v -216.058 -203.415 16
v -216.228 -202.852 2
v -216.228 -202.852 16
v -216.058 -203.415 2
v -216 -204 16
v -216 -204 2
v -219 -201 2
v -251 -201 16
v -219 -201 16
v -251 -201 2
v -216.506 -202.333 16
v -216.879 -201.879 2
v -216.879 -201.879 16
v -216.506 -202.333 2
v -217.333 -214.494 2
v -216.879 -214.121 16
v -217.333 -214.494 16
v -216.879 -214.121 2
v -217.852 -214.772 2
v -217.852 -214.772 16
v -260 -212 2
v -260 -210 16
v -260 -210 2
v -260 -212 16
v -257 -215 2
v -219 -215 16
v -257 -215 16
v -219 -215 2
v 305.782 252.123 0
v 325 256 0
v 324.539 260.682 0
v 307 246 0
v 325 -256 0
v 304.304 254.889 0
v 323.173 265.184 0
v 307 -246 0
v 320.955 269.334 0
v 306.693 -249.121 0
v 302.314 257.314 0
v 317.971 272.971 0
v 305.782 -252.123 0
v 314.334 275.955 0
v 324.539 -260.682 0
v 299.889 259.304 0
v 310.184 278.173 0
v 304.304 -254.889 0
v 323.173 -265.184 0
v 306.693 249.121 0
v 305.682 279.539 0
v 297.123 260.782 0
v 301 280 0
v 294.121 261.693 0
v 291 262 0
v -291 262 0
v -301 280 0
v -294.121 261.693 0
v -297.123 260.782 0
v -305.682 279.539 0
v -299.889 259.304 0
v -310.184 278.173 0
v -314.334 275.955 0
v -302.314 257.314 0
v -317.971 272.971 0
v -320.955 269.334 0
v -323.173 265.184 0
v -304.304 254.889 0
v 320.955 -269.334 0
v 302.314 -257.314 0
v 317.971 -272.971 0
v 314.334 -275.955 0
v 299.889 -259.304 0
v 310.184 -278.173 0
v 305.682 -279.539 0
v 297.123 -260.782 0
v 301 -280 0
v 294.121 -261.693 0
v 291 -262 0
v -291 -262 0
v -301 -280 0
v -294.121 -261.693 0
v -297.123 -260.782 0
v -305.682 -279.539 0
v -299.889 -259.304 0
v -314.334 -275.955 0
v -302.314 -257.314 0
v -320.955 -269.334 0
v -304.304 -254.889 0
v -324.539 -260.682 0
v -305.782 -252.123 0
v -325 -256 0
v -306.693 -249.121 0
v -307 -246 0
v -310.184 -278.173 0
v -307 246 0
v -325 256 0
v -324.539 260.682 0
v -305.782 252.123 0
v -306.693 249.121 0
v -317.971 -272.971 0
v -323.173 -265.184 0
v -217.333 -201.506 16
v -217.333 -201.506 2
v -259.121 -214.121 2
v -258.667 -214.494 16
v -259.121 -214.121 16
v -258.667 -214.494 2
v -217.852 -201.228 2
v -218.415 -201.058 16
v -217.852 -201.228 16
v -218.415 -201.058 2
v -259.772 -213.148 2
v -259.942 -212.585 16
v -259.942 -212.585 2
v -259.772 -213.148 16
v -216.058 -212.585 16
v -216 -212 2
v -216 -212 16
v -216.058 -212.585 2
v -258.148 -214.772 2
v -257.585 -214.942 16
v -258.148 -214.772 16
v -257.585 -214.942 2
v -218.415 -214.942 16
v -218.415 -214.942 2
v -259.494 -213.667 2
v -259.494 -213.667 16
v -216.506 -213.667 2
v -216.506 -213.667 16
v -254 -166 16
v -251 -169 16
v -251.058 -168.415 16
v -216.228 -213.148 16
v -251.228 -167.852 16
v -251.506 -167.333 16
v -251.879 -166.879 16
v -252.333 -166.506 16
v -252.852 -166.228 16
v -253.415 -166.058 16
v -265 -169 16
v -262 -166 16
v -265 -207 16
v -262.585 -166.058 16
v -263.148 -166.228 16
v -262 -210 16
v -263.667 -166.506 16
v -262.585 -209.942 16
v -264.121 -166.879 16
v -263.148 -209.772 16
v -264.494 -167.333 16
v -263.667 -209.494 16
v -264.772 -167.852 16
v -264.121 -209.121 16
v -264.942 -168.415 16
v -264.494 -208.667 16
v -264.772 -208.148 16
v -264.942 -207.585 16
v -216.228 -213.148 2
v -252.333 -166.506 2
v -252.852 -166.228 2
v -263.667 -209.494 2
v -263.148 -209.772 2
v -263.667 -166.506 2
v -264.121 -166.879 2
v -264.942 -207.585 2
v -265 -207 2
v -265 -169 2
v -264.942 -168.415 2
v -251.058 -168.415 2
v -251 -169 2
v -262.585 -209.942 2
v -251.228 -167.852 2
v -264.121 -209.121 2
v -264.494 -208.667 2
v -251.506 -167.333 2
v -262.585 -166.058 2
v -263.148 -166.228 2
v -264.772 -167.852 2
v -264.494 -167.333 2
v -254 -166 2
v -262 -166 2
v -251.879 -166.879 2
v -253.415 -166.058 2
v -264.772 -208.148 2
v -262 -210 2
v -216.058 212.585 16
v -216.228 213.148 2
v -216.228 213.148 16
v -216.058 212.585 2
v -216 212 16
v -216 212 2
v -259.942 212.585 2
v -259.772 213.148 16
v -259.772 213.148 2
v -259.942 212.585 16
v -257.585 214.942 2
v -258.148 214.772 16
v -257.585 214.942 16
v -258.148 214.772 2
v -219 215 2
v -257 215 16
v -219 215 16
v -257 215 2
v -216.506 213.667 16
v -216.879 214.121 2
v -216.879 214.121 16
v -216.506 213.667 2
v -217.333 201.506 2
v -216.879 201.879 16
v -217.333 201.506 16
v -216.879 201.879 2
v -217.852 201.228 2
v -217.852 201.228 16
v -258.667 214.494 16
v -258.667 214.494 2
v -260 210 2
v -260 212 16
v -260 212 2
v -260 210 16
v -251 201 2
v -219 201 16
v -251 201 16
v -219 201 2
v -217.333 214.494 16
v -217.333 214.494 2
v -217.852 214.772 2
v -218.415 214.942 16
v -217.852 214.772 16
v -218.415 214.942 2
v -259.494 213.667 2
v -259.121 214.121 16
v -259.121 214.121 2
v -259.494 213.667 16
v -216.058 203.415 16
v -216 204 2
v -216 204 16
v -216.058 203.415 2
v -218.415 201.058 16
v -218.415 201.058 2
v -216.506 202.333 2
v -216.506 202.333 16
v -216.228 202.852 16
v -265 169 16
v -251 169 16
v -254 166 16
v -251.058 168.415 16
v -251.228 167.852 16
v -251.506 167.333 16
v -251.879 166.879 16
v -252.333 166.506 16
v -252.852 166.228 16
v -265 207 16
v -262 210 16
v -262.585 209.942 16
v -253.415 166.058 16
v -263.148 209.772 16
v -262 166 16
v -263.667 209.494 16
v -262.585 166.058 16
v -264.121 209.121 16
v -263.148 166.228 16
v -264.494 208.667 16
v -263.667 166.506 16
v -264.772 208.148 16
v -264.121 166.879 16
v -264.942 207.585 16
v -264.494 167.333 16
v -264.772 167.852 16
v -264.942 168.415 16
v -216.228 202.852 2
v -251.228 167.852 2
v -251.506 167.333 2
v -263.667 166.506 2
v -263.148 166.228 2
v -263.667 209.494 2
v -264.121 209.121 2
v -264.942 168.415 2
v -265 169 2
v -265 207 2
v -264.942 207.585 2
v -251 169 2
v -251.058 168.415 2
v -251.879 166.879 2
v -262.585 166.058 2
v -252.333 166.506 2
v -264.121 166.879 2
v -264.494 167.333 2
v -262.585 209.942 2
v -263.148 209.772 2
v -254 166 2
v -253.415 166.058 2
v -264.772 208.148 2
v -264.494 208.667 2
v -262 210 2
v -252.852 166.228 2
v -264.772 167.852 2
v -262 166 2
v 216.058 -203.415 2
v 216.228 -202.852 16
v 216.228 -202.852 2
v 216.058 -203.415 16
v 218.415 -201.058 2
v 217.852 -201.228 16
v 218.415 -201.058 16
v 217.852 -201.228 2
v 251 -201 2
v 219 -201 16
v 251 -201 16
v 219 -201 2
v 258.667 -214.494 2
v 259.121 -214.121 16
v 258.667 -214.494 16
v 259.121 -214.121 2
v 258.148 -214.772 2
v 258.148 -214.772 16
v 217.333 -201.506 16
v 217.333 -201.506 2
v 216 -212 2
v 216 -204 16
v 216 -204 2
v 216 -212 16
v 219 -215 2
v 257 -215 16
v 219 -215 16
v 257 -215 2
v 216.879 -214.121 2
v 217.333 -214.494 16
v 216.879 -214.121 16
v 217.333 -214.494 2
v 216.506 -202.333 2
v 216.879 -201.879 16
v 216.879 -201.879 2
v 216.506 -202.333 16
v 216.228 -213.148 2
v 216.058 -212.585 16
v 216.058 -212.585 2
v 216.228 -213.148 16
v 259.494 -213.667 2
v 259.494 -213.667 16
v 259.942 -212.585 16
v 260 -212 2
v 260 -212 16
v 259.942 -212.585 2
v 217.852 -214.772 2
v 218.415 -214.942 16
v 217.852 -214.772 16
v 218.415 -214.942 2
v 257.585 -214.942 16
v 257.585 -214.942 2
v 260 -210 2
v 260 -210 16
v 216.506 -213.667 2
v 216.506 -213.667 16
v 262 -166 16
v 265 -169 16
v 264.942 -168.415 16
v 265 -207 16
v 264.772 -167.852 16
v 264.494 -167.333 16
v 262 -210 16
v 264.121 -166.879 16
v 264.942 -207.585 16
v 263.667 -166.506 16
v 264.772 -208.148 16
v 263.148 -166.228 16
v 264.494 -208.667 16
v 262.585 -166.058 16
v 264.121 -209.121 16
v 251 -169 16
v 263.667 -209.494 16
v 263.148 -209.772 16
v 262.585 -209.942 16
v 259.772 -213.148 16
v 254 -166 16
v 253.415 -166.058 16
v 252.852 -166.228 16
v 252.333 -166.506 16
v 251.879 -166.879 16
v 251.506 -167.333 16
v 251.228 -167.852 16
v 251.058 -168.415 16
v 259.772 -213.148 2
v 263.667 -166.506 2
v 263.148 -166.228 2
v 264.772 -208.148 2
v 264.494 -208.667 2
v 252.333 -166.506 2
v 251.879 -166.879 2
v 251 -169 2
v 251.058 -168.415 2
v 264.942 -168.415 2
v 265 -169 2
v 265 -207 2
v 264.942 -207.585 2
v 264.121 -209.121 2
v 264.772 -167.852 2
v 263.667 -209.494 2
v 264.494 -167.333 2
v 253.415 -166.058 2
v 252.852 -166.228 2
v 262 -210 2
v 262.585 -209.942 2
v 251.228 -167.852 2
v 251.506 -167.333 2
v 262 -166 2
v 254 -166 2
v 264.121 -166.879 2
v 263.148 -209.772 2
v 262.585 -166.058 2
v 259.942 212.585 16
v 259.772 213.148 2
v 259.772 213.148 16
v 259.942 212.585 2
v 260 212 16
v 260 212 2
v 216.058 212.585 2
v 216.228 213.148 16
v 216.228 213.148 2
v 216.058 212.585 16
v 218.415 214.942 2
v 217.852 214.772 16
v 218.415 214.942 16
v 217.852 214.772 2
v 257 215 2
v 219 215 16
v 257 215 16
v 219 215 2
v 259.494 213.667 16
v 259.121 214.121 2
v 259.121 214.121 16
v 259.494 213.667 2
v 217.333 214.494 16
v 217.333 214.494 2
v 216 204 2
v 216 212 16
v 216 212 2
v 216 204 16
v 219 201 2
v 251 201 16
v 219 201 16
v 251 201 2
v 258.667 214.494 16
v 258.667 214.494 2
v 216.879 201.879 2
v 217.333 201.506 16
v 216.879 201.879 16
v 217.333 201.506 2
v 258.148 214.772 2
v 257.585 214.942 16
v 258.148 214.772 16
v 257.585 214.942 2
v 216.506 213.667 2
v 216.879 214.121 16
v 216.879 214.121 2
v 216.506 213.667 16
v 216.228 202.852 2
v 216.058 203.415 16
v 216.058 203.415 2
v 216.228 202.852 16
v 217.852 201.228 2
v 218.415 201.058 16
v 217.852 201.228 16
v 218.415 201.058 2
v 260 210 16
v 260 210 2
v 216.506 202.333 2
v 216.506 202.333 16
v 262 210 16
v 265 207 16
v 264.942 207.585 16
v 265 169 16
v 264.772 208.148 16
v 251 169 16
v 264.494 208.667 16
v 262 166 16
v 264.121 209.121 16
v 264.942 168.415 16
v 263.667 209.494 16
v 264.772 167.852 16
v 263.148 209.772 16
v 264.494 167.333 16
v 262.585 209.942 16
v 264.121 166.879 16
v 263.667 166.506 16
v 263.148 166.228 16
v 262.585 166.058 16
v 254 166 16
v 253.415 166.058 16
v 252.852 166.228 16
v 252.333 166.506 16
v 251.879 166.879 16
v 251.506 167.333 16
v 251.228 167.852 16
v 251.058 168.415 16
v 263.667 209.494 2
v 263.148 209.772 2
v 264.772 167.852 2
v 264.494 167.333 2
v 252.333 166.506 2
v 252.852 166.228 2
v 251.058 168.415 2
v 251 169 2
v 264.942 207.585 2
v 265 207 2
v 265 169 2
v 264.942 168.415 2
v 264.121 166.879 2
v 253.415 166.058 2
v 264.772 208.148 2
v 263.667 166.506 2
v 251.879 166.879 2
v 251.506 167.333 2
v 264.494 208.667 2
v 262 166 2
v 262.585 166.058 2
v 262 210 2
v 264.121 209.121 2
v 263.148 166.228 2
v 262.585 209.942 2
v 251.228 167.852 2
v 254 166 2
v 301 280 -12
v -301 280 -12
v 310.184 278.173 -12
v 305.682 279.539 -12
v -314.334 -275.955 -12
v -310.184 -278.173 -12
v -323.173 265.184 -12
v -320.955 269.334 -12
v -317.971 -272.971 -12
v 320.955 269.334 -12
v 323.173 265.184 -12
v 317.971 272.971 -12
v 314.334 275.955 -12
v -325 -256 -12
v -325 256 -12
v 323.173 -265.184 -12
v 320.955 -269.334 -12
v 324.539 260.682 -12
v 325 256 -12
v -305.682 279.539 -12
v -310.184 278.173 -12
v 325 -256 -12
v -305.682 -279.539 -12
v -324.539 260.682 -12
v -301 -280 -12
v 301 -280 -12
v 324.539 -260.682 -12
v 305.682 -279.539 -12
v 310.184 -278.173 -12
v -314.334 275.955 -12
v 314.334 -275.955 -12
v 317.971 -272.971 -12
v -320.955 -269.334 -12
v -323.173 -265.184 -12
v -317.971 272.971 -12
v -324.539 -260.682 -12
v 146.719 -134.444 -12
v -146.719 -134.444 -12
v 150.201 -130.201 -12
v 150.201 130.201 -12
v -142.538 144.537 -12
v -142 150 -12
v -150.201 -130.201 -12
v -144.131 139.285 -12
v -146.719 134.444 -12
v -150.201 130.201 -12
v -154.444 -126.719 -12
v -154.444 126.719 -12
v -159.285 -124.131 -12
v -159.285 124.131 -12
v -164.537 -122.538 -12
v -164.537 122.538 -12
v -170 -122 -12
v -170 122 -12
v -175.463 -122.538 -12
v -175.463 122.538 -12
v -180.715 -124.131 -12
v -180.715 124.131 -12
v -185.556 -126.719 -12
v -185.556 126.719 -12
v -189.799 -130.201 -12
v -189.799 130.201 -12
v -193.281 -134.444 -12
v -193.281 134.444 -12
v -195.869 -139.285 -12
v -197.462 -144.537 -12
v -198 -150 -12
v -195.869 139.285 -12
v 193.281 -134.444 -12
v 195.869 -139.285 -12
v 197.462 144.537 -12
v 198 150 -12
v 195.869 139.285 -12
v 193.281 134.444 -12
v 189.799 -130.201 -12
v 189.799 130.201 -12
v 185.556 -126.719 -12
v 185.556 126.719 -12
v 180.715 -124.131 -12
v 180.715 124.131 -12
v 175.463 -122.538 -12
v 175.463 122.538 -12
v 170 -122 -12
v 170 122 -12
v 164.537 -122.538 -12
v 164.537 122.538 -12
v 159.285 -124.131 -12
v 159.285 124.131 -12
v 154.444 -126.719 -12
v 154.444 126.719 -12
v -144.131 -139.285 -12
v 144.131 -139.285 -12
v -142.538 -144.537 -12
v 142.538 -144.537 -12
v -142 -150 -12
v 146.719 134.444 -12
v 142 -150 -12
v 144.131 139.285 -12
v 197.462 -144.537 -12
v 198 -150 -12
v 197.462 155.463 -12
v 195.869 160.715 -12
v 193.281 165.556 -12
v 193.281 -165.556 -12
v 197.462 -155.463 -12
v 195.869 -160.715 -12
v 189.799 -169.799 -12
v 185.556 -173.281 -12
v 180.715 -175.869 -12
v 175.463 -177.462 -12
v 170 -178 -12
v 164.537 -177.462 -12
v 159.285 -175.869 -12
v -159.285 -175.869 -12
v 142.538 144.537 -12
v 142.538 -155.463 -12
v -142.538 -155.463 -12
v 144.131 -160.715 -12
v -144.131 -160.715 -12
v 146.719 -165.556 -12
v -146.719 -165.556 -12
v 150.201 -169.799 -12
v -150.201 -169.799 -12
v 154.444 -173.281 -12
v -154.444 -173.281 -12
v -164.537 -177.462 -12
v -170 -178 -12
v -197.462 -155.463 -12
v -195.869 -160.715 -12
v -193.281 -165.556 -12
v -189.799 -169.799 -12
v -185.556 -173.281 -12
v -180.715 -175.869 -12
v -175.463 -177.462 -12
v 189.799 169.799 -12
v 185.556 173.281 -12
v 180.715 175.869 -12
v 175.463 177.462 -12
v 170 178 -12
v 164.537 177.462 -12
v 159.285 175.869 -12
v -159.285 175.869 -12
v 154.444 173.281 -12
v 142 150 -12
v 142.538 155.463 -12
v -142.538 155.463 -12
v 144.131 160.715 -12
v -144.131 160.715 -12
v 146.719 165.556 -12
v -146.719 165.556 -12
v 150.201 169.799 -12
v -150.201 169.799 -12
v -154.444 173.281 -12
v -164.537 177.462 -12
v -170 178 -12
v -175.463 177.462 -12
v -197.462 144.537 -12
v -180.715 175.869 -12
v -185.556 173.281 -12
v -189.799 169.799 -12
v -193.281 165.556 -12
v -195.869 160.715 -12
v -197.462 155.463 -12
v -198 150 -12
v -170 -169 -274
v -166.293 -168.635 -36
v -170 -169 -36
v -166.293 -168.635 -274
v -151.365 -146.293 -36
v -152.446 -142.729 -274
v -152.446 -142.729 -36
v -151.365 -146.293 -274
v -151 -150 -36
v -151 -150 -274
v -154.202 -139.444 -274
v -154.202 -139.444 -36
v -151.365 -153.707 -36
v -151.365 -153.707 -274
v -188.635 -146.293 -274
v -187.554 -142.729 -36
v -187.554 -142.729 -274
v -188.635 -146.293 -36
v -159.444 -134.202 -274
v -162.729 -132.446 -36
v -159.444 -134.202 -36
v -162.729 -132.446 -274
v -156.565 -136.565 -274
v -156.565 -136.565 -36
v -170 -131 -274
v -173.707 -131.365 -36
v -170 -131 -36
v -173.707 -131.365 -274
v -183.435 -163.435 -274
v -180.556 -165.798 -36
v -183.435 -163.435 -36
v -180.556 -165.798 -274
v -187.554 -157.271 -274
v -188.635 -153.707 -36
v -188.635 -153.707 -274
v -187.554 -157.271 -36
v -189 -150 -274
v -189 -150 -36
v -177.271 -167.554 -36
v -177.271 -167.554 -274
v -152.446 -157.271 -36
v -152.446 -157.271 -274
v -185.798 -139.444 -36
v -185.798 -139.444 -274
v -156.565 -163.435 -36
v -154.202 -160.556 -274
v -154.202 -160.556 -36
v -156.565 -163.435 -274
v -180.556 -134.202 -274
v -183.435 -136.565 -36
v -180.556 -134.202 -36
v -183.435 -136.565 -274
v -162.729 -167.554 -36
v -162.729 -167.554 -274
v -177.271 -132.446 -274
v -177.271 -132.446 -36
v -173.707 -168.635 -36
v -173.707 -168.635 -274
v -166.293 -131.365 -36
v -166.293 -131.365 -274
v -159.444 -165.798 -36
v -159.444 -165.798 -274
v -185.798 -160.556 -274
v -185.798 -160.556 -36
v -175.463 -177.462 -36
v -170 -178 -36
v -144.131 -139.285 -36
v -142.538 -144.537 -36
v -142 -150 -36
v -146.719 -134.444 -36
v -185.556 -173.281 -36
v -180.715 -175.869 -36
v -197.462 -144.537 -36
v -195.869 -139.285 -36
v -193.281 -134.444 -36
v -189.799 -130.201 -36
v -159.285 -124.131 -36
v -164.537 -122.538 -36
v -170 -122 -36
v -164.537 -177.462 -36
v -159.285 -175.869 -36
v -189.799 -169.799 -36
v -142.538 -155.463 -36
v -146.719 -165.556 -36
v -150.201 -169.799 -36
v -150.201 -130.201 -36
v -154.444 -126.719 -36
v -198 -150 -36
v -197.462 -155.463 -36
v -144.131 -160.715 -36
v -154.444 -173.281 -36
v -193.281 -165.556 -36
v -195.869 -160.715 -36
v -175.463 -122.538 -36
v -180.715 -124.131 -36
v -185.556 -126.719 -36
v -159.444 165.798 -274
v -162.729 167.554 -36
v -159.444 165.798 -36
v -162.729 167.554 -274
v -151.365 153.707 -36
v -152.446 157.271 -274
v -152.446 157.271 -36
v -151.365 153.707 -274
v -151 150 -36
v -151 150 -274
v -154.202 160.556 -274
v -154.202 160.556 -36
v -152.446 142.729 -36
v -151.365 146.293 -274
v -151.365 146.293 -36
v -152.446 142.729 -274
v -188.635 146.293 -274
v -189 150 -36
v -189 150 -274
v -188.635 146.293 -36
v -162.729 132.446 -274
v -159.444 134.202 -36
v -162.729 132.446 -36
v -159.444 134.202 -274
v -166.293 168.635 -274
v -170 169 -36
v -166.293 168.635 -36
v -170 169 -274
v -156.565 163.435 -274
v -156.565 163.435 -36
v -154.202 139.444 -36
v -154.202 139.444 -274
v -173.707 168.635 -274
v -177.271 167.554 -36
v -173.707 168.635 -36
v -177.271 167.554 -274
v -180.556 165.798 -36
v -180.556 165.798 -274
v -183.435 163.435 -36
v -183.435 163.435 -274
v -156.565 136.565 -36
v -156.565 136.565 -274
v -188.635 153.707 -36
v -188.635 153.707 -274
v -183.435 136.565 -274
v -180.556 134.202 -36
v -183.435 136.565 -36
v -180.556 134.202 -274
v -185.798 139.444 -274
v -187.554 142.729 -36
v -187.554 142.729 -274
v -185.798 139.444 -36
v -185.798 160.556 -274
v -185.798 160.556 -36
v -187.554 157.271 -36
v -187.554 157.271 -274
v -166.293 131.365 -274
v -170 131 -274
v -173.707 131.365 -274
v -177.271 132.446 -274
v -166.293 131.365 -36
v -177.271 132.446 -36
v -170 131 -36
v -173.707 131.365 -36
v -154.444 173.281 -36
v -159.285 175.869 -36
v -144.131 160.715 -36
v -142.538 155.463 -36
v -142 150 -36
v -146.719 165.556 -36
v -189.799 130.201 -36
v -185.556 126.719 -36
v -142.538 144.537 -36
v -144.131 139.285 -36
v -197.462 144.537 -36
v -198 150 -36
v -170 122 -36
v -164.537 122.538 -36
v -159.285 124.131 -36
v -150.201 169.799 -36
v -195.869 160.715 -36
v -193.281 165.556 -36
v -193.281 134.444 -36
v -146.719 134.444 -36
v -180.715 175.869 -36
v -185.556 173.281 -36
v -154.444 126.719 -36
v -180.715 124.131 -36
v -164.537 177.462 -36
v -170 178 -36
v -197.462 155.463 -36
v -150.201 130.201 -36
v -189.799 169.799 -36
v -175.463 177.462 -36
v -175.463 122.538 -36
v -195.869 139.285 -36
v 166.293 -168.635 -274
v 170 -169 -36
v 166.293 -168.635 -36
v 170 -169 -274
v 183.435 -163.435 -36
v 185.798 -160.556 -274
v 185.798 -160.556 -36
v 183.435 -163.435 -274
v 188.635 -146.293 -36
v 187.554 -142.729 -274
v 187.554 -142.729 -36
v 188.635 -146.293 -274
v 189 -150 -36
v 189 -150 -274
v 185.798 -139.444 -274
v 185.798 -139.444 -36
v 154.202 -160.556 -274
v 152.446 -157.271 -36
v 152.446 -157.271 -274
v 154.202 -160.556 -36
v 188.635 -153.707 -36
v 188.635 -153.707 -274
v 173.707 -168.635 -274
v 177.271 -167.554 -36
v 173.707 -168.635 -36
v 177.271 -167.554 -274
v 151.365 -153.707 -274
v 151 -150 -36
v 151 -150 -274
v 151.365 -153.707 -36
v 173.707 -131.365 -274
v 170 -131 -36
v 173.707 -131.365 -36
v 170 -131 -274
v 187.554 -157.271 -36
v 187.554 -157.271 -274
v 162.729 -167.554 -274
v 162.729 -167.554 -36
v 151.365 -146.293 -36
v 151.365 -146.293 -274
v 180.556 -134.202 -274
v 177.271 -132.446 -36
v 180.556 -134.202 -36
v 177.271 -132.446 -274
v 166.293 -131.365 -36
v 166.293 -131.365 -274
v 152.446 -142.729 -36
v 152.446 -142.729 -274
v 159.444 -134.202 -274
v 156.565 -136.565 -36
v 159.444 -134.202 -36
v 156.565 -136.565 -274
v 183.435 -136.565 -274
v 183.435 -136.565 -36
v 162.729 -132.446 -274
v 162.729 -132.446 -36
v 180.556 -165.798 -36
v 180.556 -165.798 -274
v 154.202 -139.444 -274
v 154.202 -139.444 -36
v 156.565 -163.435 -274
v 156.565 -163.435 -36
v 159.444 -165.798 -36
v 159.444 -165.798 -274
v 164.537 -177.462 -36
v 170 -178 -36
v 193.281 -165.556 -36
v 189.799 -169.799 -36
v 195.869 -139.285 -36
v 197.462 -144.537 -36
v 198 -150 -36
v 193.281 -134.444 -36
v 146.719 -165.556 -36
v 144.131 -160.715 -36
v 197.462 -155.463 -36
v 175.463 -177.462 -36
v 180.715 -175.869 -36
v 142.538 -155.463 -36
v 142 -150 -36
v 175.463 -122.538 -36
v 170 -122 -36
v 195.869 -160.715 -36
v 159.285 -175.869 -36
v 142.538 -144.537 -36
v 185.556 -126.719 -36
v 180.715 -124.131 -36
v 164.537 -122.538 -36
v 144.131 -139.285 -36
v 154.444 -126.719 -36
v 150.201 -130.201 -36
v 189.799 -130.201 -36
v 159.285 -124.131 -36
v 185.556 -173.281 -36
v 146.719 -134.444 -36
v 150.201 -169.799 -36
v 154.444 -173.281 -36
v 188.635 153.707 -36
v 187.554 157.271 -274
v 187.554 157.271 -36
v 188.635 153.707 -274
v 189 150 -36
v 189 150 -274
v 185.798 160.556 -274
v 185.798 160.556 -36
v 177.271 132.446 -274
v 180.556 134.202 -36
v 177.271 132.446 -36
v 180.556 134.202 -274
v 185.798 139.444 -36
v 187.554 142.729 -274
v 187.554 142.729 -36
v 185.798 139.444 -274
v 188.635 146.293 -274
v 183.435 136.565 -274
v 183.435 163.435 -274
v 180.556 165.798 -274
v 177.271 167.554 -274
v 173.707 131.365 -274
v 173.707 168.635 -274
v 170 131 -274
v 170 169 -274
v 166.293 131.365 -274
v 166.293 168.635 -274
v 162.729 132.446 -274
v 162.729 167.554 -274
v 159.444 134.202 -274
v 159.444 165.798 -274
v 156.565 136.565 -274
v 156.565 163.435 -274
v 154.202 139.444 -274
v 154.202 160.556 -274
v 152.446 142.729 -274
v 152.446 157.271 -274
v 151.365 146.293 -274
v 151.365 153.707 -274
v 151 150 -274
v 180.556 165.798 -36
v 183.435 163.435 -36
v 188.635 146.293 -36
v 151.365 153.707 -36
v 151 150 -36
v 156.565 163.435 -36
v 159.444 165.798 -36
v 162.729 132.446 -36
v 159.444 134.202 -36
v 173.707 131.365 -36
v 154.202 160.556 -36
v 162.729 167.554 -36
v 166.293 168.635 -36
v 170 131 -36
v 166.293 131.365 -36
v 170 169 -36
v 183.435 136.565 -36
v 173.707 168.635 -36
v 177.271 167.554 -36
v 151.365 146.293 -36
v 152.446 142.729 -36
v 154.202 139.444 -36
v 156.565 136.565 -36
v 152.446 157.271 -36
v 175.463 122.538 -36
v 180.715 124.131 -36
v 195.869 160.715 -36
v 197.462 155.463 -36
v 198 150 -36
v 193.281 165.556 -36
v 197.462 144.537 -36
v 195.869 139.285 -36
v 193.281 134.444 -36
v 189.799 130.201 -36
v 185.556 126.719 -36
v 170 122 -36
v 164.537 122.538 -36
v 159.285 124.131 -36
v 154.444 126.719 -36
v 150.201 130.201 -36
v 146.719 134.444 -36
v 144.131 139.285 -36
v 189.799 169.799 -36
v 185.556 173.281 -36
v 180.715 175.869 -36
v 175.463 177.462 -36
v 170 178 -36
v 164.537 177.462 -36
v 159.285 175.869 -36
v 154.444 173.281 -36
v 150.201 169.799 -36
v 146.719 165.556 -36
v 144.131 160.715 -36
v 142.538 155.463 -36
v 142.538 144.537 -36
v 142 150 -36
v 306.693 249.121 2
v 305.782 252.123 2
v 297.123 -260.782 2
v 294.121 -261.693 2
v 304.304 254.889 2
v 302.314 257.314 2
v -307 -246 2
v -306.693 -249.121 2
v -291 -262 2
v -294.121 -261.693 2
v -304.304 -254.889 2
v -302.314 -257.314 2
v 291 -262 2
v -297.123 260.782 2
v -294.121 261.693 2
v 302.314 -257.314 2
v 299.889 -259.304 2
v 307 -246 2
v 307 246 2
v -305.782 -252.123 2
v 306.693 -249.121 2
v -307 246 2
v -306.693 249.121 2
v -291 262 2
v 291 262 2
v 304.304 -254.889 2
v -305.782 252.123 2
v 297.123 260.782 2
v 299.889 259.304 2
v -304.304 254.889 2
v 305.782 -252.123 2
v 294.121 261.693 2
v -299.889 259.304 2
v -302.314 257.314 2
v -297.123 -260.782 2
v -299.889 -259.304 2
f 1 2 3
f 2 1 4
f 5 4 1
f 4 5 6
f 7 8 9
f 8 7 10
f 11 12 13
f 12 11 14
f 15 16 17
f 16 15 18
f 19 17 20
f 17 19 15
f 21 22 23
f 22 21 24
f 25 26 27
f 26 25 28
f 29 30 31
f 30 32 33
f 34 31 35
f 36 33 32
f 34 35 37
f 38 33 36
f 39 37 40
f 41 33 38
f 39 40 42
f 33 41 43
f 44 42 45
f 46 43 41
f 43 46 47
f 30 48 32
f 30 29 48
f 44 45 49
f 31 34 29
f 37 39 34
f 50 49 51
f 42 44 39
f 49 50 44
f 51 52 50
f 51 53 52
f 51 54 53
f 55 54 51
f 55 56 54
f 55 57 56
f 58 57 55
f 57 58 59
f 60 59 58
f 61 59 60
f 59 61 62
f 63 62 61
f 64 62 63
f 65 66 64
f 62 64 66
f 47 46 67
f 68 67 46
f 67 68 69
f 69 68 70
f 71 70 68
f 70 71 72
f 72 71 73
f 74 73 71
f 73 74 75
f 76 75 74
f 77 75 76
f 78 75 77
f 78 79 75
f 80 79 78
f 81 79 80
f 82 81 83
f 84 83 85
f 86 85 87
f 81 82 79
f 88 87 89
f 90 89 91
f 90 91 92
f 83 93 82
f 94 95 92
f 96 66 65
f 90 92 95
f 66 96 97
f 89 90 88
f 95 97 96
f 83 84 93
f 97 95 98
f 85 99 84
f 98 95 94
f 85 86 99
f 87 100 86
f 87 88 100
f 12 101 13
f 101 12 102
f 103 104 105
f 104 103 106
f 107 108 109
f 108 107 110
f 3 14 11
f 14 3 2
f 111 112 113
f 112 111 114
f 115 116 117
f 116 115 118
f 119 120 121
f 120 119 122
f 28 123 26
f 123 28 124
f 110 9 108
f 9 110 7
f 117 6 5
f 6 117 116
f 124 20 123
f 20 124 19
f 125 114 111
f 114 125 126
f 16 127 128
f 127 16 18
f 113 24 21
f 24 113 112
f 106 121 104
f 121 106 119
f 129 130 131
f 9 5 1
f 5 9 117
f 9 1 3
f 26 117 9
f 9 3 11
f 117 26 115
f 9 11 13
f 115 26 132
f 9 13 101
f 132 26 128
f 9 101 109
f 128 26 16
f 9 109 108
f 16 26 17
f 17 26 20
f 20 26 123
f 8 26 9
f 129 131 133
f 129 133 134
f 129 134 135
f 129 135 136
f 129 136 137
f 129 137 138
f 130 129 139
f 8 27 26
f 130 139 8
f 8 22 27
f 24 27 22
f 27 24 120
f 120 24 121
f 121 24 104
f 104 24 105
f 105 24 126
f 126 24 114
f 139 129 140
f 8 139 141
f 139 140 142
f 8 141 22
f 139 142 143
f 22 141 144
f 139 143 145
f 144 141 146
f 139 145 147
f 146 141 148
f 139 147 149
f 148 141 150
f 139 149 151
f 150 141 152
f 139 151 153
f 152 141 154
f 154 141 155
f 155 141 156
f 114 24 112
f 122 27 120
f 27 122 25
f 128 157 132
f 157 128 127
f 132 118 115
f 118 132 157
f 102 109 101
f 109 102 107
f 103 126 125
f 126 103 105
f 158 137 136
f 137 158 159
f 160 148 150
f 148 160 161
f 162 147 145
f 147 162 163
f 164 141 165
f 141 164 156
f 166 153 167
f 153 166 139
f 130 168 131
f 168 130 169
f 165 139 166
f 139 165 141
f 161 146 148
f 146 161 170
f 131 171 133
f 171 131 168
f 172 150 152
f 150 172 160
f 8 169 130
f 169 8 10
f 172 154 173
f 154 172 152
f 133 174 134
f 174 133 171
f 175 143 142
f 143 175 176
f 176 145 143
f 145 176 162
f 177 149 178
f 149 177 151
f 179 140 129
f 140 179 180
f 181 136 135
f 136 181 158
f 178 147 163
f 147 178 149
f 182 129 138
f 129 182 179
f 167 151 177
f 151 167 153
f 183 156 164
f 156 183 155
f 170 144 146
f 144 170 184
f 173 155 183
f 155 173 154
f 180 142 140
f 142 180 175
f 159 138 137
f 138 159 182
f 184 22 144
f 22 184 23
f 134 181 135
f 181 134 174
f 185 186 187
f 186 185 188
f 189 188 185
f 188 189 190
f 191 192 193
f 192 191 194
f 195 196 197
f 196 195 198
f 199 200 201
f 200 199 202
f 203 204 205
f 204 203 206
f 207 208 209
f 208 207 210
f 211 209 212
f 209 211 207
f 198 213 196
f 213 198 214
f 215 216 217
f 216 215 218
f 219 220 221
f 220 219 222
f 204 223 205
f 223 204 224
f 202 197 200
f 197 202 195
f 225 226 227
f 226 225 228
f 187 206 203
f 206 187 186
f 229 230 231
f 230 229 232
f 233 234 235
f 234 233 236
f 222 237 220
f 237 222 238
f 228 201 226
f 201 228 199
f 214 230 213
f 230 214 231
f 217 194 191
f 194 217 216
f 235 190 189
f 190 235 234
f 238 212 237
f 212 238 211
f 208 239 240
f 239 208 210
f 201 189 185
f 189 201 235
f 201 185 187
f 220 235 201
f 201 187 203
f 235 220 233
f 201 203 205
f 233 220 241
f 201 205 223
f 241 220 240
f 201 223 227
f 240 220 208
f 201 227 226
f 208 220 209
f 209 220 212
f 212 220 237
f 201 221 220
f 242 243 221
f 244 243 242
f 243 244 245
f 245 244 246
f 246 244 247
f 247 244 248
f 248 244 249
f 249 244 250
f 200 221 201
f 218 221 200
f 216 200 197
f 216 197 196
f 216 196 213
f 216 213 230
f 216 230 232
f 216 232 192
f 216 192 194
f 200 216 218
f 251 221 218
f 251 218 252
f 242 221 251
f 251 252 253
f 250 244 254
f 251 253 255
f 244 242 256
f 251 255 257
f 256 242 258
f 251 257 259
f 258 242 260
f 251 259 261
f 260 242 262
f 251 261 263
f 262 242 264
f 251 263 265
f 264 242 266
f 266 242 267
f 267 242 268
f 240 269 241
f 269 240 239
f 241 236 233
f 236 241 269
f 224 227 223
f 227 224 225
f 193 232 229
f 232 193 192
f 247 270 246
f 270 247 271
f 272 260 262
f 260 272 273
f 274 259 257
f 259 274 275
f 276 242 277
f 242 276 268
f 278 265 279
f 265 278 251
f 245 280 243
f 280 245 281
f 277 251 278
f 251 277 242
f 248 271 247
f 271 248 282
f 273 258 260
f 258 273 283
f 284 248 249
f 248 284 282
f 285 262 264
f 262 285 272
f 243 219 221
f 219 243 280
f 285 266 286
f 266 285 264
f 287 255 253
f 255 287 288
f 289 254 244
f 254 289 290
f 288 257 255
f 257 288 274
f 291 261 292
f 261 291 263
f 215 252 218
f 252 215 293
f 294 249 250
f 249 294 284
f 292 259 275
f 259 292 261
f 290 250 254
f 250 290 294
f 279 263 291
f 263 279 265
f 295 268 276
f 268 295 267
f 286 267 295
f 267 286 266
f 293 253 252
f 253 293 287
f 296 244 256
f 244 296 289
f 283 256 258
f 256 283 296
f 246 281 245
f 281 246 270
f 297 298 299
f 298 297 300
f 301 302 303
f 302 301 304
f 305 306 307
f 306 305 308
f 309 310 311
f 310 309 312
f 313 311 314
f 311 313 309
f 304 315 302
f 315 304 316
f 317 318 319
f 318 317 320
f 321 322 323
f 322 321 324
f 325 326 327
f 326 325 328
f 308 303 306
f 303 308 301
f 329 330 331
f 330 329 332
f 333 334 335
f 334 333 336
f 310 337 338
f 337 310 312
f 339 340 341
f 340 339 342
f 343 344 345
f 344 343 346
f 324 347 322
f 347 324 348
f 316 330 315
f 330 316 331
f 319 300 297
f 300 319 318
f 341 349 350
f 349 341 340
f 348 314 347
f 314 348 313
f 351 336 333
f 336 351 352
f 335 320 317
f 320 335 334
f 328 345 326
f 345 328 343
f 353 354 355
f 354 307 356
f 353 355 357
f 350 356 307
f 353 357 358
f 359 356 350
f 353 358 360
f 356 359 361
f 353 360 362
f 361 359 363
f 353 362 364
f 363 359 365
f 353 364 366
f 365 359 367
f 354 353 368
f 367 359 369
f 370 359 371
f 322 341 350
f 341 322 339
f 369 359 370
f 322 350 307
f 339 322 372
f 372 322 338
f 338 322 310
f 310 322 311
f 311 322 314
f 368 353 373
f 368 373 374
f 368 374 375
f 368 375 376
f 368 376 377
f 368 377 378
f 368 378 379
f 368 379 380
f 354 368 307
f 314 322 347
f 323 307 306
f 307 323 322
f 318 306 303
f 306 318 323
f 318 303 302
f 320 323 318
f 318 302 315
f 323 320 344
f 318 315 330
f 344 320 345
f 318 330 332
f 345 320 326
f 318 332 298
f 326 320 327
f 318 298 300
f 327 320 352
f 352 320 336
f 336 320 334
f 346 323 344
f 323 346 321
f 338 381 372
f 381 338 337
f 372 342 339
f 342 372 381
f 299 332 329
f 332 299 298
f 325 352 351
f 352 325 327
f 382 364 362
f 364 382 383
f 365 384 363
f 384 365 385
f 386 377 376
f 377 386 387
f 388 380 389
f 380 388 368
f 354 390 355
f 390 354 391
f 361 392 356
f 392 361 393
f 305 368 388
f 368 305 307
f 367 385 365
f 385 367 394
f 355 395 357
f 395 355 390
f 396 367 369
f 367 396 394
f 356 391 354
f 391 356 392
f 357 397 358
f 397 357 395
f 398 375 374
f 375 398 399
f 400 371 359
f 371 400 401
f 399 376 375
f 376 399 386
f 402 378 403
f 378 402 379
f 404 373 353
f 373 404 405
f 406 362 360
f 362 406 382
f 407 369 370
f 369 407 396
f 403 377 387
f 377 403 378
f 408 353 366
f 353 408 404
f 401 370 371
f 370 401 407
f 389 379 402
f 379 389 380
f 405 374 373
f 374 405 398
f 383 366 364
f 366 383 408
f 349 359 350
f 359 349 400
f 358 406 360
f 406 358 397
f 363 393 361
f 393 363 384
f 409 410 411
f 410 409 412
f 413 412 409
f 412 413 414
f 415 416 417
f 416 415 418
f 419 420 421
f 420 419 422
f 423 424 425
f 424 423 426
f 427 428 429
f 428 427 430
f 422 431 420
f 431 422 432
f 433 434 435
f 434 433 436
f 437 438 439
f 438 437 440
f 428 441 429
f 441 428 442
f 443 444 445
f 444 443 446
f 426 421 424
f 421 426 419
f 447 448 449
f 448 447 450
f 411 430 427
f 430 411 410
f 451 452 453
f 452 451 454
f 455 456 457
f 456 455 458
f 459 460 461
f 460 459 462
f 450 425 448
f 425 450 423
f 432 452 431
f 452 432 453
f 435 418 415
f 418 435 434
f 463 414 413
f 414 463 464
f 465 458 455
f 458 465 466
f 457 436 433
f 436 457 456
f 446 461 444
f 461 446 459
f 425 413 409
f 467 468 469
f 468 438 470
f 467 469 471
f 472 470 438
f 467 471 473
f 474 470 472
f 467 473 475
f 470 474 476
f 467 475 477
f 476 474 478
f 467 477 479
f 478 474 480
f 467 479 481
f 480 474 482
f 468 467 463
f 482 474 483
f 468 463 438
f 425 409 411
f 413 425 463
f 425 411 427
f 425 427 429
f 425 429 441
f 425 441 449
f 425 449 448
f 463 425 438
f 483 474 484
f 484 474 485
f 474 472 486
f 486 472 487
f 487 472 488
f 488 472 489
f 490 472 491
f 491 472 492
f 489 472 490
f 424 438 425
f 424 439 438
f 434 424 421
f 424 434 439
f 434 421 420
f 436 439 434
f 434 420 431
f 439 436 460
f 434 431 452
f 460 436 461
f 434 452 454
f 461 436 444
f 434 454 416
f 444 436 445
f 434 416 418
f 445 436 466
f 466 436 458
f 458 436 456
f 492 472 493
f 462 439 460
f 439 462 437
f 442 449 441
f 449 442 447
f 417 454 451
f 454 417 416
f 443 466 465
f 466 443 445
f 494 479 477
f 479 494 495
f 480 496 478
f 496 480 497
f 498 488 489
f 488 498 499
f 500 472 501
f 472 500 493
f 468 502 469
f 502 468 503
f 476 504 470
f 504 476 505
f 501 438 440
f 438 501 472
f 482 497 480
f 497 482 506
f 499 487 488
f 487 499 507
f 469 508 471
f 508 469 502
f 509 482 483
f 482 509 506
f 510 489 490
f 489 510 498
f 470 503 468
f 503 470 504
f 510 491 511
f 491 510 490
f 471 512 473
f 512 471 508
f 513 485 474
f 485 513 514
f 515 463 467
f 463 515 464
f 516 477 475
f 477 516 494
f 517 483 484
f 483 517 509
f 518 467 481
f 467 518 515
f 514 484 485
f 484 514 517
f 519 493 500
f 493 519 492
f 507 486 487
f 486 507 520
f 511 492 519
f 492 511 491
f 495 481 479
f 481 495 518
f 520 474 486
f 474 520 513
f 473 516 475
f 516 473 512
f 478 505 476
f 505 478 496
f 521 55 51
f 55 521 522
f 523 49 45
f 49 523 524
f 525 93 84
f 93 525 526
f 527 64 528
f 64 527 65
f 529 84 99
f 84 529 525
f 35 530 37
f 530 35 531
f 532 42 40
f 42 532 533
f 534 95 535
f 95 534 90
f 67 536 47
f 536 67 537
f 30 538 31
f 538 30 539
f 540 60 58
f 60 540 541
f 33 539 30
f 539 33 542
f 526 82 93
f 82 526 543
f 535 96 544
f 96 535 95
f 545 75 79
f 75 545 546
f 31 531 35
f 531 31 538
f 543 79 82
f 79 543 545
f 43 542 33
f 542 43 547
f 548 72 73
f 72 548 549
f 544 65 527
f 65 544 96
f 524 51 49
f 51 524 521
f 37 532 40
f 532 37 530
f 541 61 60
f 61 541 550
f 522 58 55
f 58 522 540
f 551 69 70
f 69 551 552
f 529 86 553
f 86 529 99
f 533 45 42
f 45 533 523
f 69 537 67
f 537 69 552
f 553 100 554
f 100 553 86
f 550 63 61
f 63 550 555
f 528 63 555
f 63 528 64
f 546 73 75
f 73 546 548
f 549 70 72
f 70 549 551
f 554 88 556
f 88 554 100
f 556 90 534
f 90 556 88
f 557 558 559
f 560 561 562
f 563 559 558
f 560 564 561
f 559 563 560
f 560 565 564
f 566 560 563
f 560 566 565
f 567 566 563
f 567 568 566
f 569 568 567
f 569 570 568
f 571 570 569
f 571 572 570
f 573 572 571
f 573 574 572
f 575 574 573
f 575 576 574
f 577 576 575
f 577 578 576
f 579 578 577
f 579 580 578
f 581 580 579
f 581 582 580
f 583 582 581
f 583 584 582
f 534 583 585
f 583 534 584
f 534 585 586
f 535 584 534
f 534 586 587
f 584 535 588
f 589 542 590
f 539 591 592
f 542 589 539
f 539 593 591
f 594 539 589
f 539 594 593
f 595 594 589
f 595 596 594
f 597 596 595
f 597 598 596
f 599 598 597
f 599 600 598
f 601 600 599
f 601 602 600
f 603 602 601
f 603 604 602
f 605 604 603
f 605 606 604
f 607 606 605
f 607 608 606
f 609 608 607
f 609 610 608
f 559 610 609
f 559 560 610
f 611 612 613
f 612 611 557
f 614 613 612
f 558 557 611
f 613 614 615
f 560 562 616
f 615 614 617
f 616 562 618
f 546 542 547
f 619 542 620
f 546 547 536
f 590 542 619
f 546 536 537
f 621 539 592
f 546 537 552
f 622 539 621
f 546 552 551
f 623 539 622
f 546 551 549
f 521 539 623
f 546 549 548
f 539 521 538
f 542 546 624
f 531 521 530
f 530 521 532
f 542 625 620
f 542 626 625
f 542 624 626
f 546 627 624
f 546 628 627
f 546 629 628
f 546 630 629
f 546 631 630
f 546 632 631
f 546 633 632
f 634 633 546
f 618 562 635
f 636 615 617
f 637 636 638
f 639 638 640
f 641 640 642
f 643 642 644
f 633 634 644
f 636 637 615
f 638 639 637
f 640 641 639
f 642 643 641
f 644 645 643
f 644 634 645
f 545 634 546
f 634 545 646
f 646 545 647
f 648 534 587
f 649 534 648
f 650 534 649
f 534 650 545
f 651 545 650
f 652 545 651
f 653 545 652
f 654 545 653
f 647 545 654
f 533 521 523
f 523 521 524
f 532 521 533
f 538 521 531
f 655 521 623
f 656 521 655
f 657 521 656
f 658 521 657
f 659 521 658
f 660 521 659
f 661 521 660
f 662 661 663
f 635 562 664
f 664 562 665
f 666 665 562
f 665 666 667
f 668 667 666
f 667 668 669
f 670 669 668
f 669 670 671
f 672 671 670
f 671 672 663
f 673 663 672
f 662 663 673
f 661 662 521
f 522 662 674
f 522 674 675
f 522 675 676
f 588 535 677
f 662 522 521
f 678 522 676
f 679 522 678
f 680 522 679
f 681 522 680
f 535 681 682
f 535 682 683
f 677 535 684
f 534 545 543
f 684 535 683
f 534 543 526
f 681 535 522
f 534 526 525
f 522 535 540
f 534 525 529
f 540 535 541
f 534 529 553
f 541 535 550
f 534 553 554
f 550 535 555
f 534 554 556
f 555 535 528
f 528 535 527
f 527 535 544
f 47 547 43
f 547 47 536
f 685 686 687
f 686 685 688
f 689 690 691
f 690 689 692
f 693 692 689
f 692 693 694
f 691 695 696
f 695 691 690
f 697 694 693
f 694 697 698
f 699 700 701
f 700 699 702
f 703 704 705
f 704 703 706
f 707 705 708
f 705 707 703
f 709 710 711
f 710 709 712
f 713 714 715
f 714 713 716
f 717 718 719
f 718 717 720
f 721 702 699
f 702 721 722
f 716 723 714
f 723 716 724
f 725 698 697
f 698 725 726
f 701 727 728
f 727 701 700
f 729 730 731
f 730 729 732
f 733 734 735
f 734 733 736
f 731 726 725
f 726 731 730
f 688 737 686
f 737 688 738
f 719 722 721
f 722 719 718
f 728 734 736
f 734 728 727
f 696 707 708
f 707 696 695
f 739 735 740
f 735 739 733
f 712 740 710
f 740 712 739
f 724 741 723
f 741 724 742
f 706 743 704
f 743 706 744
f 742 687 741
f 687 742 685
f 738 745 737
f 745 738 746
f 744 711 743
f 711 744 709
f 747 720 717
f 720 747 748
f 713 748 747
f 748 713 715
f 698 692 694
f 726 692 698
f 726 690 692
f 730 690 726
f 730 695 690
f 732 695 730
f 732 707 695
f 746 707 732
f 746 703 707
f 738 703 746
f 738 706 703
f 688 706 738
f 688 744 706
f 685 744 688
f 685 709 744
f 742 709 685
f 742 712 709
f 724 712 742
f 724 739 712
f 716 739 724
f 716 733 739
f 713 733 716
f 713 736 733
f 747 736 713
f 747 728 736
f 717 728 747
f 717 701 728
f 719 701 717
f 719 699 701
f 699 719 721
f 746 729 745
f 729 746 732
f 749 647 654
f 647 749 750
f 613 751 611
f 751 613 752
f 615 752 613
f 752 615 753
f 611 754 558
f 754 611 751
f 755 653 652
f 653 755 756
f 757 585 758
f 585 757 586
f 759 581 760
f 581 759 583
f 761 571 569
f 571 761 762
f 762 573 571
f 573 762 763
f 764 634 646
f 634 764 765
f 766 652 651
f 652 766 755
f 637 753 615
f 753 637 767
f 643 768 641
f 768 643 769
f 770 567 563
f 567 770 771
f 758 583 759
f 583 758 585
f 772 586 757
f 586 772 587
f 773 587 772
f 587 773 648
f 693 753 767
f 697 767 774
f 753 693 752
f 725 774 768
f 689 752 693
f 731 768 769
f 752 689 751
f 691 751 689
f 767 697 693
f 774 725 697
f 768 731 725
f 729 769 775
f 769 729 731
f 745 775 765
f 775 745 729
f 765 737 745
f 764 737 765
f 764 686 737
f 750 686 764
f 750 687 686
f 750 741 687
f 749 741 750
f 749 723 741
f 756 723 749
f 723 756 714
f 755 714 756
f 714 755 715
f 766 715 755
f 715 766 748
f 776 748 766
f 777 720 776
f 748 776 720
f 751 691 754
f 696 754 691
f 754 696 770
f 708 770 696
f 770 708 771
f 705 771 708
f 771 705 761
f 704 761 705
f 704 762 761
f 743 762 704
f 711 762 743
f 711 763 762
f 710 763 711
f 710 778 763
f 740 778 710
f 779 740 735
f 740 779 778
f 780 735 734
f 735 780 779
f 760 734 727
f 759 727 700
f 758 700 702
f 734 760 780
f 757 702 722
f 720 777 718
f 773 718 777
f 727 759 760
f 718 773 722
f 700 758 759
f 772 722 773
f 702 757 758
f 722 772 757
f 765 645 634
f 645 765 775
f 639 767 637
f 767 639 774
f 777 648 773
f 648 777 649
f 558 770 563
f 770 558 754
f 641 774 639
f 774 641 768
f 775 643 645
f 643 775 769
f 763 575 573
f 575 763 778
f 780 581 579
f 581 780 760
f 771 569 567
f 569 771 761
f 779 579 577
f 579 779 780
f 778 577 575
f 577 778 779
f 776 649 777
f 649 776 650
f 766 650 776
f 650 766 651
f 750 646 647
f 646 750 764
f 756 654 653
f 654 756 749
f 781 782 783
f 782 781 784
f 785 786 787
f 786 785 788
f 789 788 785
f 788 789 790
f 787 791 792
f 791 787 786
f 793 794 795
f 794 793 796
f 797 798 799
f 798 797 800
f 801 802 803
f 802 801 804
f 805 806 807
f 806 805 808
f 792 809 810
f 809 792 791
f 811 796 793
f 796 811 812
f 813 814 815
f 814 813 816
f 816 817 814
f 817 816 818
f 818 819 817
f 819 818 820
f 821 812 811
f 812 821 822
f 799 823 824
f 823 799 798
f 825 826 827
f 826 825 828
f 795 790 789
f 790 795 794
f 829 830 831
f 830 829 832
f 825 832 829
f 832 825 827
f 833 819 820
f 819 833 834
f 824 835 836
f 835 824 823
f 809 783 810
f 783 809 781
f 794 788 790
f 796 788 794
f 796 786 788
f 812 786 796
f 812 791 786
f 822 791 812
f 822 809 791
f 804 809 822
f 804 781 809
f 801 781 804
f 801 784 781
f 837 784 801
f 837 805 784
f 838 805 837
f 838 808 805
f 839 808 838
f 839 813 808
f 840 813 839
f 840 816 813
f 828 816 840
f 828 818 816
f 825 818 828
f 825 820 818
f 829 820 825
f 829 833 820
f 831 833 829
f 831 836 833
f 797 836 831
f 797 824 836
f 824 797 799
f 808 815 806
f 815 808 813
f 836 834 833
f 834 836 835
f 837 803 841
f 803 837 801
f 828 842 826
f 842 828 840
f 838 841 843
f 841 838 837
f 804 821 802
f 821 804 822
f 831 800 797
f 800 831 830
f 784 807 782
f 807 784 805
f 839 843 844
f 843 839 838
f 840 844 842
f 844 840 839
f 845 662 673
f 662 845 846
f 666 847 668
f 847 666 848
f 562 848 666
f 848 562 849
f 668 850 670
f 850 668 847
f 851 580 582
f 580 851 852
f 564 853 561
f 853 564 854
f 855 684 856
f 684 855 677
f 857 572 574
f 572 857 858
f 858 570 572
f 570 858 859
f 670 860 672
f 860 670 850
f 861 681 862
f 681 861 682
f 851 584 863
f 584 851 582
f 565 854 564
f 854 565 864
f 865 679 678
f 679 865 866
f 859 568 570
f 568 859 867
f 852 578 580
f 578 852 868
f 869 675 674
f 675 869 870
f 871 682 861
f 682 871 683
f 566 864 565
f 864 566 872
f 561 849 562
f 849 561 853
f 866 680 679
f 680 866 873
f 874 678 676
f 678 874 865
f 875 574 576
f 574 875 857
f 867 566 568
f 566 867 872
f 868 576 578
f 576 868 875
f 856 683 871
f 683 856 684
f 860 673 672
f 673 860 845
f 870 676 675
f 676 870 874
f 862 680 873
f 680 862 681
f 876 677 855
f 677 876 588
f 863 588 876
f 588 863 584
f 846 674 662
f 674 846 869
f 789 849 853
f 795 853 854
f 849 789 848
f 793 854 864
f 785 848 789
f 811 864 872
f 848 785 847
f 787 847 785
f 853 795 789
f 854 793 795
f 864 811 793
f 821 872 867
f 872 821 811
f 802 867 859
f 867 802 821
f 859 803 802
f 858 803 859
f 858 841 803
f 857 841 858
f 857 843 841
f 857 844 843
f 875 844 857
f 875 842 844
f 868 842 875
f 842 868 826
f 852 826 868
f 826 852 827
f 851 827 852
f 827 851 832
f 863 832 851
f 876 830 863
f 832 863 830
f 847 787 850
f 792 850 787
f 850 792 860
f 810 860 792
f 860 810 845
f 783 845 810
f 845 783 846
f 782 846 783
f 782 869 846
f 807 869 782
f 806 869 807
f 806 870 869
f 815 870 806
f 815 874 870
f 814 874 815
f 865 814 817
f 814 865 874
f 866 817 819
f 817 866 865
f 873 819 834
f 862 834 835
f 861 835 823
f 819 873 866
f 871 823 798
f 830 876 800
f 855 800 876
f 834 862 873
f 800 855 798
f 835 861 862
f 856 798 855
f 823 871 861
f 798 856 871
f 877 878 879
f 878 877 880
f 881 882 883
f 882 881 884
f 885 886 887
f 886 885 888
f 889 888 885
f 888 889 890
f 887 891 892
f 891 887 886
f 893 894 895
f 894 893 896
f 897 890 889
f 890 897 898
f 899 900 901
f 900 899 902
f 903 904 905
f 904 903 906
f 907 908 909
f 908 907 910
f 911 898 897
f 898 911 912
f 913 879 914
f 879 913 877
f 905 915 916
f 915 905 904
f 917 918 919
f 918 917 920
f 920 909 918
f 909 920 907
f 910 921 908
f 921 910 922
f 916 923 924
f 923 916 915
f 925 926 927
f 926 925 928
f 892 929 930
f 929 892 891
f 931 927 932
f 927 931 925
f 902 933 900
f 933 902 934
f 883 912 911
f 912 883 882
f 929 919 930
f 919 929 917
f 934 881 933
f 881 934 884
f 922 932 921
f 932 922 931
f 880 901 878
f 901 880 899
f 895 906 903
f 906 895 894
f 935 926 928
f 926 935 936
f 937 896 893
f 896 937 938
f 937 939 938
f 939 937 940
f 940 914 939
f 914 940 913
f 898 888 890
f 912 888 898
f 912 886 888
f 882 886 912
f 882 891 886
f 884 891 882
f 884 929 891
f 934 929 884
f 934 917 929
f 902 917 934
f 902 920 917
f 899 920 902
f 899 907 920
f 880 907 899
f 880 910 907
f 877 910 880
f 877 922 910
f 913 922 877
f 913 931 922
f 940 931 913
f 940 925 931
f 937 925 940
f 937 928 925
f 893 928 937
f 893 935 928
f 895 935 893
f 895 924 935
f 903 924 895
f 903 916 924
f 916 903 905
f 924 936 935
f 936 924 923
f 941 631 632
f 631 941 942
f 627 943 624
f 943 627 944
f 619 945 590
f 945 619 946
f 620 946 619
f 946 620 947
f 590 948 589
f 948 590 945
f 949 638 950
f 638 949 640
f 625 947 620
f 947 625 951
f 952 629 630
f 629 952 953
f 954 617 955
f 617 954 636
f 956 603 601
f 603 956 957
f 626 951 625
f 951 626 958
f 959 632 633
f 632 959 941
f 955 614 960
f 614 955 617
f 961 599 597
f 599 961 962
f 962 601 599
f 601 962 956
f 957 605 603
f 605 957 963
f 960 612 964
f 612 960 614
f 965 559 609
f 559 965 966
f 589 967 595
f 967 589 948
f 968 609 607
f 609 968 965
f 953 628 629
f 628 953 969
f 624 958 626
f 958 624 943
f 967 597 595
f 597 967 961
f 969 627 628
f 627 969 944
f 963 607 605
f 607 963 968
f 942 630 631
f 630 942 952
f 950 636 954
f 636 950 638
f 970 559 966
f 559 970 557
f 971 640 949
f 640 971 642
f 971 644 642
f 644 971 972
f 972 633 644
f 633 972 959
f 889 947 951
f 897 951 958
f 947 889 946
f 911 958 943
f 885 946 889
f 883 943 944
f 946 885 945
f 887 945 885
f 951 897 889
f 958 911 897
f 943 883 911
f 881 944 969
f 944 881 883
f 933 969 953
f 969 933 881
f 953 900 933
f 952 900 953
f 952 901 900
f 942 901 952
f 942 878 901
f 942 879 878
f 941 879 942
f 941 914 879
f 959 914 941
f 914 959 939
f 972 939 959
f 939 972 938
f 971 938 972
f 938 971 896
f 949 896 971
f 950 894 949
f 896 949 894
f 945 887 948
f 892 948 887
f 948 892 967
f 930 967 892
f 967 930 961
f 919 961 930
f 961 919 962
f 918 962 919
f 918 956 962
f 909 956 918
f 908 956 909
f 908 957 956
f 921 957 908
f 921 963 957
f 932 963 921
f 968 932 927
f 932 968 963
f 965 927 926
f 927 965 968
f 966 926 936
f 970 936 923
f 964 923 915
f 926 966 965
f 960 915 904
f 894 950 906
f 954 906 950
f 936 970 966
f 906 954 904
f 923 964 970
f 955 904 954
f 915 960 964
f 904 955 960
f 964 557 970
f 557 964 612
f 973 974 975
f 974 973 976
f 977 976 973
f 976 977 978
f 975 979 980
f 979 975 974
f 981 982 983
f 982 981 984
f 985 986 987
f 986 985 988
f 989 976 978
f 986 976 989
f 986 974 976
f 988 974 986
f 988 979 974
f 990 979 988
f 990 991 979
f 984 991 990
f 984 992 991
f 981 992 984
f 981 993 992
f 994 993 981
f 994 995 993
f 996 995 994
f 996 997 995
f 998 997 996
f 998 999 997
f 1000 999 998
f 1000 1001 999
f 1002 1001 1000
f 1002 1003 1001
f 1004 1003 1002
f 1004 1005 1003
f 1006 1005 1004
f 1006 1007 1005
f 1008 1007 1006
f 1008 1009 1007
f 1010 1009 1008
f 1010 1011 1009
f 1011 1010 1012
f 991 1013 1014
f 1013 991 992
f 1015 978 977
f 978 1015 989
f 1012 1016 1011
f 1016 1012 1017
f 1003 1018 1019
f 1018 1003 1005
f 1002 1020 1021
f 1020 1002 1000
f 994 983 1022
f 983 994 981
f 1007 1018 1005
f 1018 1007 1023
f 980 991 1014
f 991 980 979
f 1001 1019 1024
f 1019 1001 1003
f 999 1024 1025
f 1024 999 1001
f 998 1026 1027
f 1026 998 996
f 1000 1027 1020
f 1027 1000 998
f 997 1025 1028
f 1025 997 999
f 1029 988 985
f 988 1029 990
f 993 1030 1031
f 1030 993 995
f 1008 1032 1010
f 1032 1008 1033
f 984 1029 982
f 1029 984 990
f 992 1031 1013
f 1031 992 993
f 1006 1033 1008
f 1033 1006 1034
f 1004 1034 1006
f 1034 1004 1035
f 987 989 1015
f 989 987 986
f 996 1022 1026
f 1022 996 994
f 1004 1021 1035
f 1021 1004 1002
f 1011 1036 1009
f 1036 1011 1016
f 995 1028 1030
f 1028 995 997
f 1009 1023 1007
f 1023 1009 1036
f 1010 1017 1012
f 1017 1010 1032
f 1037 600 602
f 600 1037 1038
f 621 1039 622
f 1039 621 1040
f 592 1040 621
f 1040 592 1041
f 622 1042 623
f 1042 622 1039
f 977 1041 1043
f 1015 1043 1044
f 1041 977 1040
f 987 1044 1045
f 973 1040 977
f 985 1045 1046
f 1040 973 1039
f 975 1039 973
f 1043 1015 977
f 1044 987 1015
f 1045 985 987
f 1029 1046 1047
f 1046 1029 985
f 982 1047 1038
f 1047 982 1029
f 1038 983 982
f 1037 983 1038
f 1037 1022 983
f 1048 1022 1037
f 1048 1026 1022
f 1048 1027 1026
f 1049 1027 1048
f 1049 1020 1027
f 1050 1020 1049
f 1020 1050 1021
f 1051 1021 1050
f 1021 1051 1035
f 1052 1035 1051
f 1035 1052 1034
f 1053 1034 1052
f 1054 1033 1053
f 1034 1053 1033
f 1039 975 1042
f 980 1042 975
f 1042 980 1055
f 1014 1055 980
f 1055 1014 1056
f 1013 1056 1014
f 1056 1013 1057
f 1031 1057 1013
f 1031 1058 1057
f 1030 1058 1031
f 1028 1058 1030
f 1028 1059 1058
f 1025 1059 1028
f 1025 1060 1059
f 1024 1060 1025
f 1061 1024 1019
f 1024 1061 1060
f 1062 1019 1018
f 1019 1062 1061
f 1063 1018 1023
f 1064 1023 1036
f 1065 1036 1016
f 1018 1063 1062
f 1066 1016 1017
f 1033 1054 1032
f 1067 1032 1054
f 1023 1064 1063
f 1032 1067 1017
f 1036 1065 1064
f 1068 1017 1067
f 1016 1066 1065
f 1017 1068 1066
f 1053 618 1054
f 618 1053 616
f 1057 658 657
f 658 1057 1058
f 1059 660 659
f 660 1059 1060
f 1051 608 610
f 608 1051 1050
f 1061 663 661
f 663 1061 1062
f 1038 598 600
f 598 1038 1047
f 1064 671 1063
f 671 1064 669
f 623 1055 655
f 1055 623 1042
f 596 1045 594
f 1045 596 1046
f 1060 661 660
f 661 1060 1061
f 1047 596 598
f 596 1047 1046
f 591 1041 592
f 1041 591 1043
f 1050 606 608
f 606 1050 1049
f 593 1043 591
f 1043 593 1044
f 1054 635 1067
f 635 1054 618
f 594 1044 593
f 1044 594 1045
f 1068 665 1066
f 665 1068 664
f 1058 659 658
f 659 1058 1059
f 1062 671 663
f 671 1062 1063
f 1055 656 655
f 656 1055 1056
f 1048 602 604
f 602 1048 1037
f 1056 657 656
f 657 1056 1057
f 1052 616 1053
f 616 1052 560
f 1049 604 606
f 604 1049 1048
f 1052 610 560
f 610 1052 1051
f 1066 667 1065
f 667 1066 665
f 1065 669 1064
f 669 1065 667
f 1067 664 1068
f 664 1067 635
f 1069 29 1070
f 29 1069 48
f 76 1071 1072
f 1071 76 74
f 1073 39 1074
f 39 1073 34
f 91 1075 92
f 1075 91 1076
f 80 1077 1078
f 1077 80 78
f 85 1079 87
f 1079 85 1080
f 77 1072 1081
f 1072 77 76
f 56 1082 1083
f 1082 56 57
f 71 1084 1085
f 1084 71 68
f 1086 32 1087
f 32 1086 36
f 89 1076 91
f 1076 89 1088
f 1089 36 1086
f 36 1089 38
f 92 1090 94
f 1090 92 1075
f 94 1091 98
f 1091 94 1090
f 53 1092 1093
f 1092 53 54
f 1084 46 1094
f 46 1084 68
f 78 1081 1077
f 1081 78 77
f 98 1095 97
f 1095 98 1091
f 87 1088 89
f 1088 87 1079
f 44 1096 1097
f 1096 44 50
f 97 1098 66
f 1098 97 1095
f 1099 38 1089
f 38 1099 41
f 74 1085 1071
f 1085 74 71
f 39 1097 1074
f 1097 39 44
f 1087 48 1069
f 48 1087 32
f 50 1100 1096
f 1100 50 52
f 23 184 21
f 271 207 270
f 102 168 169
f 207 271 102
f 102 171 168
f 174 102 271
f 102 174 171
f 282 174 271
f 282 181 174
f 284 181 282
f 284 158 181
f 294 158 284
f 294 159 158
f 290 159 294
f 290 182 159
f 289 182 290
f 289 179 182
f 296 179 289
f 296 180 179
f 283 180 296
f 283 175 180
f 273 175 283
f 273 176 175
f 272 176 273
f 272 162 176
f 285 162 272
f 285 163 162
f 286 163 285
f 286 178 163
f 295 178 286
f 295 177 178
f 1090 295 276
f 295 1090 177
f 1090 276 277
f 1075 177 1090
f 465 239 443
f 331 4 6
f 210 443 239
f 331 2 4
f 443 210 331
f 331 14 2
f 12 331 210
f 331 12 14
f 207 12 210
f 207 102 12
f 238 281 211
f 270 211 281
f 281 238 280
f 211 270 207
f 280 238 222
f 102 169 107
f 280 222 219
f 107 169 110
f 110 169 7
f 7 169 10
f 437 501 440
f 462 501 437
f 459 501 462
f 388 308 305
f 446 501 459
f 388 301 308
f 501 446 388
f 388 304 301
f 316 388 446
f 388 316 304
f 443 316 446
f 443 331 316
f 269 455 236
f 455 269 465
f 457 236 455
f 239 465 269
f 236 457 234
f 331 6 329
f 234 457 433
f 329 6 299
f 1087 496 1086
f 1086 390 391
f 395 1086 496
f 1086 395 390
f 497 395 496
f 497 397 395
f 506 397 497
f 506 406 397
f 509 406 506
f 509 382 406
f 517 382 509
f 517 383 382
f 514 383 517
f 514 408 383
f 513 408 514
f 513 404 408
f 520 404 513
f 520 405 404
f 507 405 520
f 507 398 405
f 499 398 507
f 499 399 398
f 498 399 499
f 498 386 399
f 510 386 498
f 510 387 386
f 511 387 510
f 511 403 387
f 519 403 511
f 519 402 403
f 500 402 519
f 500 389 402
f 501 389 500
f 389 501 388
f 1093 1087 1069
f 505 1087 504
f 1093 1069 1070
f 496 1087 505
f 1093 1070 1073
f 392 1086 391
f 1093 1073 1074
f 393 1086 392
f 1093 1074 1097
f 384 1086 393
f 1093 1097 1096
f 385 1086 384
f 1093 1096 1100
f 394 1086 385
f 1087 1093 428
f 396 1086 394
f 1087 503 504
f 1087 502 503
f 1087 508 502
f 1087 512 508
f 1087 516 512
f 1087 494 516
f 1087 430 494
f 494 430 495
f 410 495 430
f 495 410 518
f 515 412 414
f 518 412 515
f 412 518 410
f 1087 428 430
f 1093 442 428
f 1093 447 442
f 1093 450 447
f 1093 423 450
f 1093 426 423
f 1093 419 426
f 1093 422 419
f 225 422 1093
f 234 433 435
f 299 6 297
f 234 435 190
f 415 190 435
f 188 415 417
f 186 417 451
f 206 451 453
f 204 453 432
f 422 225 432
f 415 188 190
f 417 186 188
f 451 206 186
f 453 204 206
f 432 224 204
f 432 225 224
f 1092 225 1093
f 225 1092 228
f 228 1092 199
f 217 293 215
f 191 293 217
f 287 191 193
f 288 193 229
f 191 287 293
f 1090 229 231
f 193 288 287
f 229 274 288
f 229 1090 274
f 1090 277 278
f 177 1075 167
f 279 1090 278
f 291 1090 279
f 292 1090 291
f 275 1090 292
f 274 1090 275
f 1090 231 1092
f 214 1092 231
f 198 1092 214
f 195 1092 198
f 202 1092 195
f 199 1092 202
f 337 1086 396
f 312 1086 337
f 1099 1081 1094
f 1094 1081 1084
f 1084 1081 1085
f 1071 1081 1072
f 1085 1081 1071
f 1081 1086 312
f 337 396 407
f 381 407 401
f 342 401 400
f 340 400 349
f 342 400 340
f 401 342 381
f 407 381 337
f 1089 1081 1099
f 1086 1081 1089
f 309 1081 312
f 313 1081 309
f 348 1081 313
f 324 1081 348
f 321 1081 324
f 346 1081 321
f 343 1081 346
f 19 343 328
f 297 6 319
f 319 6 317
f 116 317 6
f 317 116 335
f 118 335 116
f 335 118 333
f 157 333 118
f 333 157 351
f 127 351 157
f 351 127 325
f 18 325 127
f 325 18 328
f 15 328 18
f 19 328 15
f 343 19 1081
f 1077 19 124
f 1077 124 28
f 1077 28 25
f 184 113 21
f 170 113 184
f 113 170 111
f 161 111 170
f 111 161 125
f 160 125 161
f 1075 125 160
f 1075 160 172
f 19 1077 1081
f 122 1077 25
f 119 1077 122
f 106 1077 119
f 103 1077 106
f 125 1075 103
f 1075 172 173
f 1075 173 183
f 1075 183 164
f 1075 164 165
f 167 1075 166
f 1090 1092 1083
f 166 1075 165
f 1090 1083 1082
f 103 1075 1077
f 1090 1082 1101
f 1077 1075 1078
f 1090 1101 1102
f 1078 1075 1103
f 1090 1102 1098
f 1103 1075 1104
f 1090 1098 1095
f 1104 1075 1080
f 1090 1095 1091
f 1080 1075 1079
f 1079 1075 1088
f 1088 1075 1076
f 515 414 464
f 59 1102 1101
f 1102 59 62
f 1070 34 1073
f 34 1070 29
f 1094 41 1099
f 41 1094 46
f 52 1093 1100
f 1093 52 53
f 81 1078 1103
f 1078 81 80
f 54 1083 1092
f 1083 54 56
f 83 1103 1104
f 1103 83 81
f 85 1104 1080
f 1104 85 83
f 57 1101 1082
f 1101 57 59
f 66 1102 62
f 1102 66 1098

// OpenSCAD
// ============================================================================
// FILE: export_lift_platform.scad
// OUTPUT: lift_platform_visual.stl
// PURPOSE:
// Export only the moving lift deck and four moving sleeves.
// Scissor bars are excluded and displayed dynamically in RViz2.
// ============================================================================

use <main.scad>


// ============================================================================
// RENDER SETTINGS
// ============================================================================

eps = 0.05;

quality = "render";

preview_fn = 32;
render_fn  = 72;

$fn = quality == "render"
    ? render_fn
    : preview_fn;


// ============================================================================
// REQUIRED PARAMETERS
// Units: millimeters
// ============================================================================

lift_center_x       = -15;
lift_lowered_deck_z = 330;
lift_deck_thickness = 12;

lift_rail_x          = 170;
lift_rail_y          = 150;
lift_sleeve_diameter = 38;

payload_deck_length = 650;
payload_deck_width  = 560;

payload_box_length = 500;
payload_box_width  = 400;

chassis_upper_z         = 250;
chassis_top_z0          = chassis_upper_z;
chassis_plate_thickness = 6;

chassis_top_z1 =
    chassis_top_z0 +
    chassis_plate_thickness;


// ============================================================================
// MOVING LIFT PLATFORM EXPORT
//
// Move the lowered platform joint frame to STL origin.
//
// false = do not include scissor bars in this STL.
// ============================================================================

translate([
    -lift_center_x,
    0,
    -lift_lowered_deck_z
])
    lift_moving_part(
        0,
        false
    );
